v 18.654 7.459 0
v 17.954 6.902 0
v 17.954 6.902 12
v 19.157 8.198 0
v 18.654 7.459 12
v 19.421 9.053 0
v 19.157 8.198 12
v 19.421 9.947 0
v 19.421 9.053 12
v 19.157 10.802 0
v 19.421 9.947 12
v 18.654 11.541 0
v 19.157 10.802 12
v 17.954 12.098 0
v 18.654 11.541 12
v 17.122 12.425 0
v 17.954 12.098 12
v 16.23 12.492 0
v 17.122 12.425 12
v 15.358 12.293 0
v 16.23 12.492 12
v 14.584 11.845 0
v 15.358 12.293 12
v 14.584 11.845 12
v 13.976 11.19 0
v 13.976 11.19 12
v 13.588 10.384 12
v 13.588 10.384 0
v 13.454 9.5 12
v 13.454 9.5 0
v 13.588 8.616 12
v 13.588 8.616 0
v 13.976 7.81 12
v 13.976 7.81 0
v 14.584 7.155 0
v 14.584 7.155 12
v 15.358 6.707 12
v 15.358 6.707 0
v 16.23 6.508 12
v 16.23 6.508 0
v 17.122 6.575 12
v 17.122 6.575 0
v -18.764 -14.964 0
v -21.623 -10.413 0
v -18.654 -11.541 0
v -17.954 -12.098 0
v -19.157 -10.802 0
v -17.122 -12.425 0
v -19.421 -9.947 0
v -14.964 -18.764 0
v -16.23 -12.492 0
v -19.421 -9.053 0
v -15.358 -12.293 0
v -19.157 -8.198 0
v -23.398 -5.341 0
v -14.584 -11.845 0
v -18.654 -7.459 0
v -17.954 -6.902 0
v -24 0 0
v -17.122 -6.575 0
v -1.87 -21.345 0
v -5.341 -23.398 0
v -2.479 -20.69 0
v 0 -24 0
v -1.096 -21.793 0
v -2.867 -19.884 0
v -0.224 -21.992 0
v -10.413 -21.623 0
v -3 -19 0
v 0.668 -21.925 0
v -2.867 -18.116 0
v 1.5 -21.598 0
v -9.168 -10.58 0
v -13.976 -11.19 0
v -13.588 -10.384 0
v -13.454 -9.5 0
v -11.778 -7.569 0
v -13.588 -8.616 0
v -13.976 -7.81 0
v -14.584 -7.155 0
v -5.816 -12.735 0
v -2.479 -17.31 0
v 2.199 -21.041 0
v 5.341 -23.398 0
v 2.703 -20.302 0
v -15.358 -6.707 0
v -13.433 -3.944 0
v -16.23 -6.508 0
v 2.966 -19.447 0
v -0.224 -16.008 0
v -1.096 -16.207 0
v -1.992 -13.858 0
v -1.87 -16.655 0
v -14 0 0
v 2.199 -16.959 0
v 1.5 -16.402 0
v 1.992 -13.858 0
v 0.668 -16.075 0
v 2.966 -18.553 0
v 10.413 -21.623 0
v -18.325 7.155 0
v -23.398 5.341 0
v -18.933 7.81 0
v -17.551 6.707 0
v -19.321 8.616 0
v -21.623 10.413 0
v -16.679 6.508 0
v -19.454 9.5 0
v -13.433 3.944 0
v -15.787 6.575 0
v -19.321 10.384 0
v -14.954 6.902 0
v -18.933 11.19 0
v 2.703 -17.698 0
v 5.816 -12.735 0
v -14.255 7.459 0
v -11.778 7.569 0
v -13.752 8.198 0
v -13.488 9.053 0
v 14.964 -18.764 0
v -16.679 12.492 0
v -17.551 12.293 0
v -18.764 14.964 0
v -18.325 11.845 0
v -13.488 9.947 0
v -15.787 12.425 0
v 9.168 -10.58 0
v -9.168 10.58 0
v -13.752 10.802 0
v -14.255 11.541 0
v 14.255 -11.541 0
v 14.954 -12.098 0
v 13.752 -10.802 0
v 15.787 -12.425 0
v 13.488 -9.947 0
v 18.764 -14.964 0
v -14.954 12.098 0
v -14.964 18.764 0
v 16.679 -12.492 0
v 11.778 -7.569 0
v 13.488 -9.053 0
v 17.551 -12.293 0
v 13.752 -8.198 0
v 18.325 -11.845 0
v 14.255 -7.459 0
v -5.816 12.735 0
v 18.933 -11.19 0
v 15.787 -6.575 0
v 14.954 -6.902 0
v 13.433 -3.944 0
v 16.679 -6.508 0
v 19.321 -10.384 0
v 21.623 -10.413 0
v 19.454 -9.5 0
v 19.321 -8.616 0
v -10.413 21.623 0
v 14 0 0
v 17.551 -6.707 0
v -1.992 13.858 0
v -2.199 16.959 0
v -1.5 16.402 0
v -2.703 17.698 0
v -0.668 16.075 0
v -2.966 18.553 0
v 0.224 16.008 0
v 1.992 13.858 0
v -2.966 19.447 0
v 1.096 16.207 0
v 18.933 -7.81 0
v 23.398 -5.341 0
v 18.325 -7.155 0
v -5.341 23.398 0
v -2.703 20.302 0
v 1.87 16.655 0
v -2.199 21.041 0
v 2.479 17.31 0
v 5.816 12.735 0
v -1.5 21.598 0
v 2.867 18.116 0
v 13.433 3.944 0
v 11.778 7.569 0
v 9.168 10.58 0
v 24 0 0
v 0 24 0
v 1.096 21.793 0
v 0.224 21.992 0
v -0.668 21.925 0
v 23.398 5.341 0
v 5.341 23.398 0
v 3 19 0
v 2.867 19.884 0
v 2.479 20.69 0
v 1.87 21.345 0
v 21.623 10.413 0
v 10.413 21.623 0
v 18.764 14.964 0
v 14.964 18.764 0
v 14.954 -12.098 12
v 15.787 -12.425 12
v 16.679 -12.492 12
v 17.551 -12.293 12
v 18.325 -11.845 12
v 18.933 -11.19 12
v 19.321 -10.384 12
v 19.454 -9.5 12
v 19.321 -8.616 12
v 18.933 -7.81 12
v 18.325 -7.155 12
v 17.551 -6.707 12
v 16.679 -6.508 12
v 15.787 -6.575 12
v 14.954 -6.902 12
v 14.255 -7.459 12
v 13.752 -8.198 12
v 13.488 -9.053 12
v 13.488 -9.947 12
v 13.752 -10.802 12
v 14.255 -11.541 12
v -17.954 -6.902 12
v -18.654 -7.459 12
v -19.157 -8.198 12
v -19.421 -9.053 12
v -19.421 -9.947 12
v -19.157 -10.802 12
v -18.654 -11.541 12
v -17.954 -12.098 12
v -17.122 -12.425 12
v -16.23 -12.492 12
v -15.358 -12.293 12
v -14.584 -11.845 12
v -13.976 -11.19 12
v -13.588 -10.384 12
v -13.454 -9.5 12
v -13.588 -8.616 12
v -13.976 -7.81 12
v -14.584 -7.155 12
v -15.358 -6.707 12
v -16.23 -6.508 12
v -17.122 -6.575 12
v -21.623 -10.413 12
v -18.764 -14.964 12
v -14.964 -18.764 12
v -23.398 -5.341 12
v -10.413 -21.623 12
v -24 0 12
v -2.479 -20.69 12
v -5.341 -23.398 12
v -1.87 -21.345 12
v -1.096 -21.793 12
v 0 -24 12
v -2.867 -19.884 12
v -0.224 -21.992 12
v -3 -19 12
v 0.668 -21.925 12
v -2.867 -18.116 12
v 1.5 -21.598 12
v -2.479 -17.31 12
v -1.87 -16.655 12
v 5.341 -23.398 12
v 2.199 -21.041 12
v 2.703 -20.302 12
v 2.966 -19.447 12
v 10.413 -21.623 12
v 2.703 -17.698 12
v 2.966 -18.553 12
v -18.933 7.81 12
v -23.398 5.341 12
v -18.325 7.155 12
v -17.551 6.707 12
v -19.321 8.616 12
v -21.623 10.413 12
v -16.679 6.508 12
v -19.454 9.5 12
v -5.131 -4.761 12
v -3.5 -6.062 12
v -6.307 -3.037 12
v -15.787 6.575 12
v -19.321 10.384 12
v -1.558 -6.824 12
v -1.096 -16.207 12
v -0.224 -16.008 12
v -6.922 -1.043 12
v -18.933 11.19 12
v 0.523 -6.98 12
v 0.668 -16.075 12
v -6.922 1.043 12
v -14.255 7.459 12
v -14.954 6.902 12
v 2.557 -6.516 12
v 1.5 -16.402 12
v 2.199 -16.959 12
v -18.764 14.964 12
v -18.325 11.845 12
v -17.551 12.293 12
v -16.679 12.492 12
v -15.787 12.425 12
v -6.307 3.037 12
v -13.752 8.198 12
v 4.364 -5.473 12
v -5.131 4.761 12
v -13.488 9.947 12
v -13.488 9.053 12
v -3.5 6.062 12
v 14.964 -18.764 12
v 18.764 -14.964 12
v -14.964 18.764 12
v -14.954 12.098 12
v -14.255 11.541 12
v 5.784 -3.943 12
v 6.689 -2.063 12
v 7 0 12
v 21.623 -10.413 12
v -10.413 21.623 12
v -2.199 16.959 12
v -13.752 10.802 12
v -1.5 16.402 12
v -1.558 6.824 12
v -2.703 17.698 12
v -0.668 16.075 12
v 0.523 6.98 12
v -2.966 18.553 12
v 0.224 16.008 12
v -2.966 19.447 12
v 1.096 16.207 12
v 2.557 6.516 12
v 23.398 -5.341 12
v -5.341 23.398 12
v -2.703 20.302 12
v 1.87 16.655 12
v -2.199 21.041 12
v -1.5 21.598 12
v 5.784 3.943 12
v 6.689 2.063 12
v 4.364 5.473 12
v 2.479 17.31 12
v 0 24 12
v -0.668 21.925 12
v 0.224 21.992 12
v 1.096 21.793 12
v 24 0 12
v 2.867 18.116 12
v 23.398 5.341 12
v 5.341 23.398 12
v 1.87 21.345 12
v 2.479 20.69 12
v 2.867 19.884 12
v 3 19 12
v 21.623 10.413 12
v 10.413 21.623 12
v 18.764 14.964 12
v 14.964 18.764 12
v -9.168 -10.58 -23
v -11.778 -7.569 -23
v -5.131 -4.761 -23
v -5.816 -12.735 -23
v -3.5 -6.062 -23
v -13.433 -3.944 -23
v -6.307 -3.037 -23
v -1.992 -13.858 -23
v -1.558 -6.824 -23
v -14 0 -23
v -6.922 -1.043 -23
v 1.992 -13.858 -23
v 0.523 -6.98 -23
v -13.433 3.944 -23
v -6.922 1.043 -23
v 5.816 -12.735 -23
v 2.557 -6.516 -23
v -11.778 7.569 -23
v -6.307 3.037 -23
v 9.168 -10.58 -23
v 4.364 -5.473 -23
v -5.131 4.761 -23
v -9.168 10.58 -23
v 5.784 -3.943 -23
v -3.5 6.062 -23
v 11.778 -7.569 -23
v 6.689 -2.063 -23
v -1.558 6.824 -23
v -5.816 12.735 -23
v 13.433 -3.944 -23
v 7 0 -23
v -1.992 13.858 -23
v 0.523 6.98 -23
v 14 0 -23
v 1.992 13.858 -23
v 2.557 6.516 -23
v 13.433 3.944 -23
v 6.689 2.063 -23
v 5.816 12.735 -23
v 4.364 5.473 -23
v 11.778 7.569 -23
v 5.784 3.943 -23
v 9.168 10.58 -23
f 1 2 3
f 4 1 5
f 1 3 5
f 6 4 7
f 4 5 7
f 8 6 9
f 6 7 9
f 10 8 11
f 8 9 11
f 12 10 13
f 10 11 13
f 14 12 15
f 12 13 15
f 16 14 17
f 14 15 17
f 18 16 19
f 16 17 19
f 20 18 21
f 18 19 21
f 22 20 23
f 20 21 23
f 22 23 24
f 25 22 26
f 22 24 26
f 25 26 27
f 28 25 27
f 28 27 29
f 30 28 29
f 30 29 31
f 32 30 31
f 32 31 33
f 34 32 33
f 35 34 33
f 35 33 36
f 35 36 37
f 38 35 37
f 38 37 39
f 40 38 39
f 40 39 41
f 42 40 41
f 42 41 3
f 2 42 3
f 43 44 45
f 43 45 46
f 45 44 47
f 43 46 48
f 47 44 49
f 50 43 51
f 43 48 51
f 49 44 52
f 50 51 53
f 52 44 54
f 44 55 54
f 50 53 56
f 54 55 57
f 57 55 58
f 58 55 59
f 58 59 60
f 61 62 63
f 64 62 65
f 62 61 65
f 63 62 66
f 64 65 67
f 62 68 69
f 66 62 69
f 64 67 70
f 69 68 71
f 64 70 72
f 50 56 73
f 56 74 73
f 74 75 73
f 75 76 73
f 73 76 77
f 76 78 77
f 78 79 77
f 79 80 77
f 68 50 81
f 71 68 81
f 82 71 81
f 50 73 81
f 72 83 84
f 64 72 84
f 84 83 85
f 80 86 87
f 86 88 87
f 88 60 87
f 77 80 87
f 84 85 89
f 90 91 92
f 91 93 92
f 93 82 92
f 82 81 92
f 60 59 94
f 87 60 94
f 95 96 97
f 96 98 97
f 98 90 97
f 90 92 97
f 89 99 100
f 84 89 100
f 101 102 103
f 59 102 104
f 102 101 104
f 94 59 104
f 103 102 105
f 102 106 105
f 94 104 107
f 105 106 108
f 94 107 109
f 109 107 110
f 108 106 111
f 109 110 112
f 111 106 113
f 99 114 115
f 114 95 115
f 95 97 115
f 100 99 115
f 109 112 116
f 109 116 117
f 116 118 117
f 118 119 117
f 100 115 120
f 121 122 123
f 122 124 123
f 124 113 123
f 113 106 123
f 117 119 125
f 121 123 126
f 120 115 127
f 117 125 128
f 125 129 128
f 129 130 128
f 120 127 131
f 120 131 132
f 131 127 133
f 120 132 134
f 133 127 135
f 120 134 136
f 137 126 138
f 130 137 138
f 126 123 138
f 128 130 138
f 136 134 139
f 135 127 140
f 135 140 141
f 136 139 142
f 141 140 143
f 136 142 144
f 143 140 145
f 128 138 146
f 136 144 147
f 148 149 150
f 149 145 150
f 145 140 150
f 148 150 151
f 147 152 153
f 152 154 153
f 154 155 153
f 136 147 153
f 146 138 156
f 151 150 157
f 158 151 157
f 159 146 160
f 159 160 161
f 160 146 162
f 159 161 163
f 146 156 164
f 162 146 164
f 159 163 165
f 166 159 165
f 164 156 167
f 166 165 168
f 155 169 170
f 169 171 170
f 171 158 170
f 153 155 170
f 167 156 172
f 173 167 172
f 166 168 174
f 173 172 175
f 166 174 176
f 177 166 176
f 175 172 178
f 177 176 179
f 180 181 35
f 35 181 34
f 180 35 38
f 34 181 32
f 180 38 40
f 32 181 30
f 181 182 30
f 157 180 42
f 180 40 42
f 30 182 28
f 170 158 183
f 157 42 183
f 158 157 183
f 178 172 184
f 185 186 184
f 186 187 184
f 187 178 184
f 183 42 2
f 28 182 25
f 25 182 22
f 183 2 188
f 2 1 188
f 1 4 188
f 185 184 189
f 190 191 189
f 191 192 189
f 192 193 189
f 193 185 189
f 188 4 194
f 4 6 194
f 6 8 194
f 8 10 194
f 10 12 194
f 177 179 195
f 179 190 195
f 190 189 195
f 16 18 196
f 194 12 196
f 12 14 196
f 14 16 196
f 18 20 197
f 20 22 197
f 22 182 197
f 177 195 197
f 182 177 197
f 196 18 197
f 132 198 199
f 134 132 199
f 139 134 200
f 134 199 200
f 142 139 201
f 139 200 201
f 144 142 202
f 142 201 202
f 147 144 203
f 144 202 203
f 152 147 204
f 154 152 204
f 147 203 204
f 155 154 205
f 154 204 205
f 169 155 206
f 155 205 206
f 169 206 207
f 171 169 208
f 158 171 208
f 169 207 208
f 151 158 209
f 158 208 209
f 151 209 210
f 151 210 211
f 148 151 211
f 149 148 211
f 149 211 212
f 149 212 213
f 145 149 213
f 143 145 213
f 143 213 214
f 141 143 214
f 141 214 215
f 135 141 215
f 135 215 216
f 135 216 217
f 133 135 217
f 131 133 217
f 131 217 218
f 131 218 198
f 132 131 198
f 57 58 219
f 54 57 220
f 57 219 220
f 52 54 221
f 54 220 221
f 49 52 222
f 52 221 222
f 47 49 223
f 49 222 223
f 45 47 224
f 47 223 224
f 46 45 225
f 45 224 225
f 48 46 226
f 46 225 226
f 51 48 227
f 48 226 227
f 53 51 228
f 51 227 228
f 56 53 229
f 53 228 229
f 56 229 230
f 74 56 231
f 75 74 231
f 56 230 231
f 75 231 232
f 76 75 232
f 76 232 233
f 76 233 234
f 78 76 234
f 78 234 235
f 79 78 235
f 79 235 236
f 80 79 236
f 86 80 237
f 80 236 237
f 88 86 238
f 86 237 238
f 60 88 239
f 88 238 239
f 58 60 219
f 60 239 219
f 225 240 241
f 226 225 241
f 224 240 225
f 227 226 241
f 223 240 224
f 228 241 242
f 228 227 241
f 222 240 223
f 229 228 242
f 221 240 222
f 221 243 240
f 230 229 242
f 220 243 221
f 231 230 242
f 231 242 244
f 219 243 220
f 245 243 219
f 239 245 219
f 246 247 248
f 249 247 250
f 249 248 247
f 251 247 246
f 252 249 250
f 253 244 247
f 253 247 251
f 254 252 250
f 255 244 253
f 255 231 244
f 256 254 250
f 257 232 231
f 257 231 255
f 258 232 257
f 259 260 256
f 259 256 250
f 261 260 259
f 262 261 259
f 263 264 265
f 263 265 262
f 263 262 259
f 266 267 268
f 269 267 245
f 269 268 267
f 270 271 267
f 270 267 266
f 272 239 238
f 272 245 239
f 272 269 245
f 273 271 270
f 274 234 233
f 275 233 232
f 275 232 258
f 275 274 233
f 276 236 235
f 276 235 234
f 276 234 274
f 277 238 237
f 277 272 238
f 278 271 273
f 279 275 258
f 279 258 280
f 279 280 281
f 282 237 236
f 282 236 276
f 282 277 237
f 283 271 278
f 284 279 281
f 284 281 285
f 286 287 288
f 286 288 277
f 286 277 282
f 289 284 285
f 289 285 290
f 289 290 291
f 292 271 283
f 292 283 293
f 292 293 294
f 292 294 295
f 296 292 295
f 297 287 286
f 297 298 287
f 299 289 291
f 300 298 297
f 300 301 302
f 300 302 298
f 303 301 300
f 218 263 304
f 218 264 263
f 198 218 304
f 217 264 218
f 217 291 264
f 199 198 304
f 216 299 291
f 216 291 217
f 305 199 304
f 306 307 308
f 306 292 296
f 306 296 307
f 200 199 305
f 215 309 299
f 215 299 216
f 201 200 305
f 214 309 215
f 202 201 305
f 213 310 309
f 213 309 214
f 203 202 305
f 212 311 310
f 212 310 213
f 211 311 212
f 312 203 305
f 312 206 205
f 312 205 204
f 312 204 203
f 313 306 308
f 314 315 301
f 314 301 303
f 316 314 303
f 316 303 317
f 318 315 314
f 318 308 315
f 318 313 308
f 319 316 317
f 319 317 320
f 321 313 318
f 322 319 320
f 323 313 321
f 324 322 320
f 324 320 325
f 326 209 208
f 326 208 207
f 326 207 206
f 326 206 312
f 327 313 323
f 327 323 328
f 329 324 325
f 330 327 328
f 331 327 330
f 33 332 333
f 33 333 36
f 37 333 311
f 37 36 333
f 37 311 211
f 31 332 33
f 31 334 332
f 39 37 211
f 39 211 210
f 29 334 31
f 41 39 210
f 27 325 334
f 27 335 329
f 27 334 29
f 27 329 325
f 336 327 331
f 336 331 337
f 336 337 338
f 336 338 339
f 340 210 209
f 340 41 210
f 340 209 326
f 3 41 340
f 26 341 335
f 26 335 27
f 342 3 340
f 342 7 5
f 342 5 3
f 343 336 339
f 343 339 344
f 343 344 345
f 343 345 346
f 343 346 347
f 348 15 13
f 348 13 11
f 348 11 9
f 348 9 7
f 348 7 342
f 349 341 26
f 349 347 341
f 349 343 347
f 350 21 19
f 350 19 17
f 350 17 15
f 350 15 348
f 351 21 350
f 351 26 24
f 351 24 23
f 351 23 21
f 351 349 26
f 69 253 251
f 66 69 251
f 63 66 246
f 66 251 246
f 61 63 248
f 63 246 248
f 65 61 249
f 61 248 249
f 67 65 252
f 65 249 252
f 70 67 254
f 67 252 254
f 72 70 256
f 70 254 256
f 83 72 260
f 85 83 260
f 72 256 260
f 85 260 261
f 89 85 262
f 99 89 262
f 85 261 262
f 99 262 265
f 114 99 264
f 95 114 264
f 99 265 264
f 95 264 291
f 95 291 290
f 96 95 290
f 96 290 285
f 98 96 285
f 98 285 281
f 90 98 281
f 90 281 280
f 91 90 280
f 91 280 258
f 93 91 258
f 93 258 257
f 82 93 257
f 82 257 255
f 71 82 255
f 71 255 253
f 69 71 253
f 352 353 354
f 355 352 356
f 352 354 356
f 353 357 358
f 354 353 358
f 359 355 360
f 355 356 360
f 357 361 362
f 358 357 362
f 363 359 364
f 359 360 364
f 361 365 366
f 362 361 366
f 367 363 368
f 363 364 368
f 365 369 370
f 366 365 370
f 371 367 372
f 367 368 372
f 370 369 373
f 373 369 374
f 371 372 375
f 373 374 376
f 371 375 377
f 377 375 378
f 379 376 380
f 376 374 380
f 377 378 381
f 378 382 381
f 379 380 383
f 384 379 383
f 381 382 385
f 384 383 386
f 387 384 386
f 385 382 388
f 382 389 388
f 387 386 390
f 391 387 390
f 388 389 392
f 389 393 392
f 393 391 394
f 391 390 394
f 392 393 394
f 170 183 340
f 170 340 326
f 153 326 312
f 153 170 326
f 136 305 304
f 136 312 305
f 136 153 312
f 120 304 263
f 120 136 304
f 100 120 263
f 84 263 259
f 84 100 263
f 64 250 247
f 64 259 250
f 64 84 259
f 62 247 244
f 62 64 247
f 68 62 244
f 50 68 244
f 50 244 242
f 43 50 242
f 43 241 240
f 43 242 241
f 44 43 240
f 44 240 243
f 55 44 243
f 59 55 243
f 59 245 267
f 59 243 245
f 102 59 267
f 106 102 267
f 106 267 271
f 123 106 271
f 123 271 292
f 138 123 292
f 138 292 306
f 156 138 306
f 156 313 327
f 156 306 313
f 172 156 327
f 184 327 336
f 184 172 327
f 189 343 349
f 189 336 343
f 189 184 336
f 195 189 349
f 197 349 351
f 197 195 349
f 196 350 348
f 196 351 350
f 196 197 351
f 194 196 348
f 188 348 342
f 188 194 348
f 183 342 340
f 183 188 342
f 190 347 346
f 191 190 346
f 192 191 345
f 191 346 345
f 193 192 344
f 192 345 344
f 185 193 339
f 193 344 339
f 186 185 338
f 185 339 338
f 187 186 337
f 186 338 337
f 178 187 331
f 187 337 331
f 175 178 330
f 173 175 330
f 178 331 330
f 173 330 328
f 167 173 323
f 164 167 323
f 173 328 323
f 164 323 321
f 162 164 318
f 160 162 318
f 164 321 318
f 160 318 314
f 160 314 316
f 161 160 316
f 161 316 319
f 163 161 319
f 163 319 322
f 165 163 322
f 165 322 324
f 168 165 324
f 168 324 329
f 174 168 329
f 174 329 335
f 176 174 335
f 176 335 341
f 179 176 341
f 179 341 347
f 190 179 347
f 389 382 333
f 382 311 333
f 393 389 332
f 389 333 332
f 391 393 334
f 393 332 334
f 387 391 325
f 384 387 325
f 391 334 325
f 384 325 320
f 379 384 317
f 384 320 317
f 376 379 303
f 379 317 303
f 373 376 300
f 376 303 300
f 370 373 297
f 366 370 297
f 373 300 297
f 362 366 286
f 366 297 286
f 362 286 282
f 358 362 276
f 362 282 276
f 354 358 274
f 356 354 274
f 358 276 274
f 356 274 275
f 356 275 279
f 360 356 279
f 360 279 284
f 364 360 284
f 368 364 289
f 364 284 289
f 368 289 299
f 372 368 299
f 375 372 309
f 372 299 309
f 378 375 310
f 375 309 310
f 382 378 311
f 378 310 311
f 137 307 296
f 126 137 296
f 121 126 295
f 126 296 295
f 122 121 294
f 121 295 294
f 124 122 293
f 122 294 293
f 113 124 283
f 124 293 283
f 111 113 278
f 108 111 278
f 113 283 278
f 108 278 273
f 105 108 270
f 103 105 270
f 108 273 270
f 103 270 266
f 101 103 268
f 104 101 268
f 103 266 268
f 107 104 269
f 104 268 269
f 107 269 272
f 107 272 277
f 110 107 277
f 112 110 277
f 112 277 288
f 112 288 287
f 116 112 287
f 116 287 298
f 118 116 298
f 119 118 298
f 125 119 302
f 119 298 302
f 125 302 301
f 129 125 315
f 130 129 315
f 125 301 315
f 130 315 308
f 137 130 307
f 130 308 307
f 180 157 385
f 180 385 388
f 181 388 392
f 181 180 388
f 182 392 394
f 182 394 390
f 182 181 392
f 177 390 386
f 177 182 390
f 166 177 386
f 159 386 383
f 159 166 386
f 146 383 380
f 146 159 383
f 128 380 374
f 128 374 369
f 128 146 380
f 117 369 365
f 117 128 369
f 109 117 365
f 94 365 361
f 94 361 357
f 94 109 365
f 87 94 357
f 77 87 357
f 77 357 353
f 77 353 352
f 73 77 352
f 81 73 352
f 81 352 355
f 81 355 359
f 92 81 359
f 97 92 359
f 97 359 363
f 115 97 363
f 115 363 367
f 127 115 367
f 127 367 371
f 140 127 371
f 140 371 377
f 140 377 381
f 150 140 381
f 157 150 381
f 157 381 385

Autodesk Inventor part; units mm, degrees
ref_plane "YZ Plane" through (0, 0, 0) normal (1, 0, 0) x (0, 1, 0)
ref_plane "XZ Plane" through (0, 0, 0) normal (0, 1, 0) x (-1, 0, 0)
ref_plane "XY Plane" through (0, 0, 0) normal (0, 0, 1) x (1, 0, 0)
sketch "Szkic1" plane through (0, 0, 0) normal (0, 0, 1) x (1, 0, 0)
  circle A0 centre (0, 0) radius 24
  circle A1 centre (0, 0) radius 14
  dimension "d0" = 48
  dimension "d1" = 28
extrude "Wyciągnięcie proste1" add sketch "Szkic1" along normal blind 12
sketch "Szkic2" plane through (0, 0, 12) normal (0, 0, 1) x (1, 0, 0)
  circle A0 centre (0, 0) radius 19
  circle A1 centre (0, 19) radius 3
  dimension "d4" = 38
  dimension "d5" = 6
extrude "Wyciągnięcie proste2" cut sketch "Szkic2" against normal blind 12 contours A1 A0 | A0 A1 picked at (0, 17.9824) picked at (0.0843, 19.9789)
pattern_circular "Szyk kołowy1" count 6 over 360 about axis through (0, 0, 0) along (0, 0, 1) of "Wyciągnięcie proste2"
sketch "Szkic3" plane through (0, 0, 12) normal (0, 0, 1) x (1, 0, 0)
  circle A0 centre (0, 0) radius 14
  circle A1 centre (0, 0) radius 7
  dimension "d11" = 28
  dimension "d12" = 14
extrude "Wyciągnięcie proste3" add sketch "Szkic3" against normal blind 35
properties part number "Cartesian1_Z_TrapezoiadlNut" material "Brąz, miękki cynowy"
